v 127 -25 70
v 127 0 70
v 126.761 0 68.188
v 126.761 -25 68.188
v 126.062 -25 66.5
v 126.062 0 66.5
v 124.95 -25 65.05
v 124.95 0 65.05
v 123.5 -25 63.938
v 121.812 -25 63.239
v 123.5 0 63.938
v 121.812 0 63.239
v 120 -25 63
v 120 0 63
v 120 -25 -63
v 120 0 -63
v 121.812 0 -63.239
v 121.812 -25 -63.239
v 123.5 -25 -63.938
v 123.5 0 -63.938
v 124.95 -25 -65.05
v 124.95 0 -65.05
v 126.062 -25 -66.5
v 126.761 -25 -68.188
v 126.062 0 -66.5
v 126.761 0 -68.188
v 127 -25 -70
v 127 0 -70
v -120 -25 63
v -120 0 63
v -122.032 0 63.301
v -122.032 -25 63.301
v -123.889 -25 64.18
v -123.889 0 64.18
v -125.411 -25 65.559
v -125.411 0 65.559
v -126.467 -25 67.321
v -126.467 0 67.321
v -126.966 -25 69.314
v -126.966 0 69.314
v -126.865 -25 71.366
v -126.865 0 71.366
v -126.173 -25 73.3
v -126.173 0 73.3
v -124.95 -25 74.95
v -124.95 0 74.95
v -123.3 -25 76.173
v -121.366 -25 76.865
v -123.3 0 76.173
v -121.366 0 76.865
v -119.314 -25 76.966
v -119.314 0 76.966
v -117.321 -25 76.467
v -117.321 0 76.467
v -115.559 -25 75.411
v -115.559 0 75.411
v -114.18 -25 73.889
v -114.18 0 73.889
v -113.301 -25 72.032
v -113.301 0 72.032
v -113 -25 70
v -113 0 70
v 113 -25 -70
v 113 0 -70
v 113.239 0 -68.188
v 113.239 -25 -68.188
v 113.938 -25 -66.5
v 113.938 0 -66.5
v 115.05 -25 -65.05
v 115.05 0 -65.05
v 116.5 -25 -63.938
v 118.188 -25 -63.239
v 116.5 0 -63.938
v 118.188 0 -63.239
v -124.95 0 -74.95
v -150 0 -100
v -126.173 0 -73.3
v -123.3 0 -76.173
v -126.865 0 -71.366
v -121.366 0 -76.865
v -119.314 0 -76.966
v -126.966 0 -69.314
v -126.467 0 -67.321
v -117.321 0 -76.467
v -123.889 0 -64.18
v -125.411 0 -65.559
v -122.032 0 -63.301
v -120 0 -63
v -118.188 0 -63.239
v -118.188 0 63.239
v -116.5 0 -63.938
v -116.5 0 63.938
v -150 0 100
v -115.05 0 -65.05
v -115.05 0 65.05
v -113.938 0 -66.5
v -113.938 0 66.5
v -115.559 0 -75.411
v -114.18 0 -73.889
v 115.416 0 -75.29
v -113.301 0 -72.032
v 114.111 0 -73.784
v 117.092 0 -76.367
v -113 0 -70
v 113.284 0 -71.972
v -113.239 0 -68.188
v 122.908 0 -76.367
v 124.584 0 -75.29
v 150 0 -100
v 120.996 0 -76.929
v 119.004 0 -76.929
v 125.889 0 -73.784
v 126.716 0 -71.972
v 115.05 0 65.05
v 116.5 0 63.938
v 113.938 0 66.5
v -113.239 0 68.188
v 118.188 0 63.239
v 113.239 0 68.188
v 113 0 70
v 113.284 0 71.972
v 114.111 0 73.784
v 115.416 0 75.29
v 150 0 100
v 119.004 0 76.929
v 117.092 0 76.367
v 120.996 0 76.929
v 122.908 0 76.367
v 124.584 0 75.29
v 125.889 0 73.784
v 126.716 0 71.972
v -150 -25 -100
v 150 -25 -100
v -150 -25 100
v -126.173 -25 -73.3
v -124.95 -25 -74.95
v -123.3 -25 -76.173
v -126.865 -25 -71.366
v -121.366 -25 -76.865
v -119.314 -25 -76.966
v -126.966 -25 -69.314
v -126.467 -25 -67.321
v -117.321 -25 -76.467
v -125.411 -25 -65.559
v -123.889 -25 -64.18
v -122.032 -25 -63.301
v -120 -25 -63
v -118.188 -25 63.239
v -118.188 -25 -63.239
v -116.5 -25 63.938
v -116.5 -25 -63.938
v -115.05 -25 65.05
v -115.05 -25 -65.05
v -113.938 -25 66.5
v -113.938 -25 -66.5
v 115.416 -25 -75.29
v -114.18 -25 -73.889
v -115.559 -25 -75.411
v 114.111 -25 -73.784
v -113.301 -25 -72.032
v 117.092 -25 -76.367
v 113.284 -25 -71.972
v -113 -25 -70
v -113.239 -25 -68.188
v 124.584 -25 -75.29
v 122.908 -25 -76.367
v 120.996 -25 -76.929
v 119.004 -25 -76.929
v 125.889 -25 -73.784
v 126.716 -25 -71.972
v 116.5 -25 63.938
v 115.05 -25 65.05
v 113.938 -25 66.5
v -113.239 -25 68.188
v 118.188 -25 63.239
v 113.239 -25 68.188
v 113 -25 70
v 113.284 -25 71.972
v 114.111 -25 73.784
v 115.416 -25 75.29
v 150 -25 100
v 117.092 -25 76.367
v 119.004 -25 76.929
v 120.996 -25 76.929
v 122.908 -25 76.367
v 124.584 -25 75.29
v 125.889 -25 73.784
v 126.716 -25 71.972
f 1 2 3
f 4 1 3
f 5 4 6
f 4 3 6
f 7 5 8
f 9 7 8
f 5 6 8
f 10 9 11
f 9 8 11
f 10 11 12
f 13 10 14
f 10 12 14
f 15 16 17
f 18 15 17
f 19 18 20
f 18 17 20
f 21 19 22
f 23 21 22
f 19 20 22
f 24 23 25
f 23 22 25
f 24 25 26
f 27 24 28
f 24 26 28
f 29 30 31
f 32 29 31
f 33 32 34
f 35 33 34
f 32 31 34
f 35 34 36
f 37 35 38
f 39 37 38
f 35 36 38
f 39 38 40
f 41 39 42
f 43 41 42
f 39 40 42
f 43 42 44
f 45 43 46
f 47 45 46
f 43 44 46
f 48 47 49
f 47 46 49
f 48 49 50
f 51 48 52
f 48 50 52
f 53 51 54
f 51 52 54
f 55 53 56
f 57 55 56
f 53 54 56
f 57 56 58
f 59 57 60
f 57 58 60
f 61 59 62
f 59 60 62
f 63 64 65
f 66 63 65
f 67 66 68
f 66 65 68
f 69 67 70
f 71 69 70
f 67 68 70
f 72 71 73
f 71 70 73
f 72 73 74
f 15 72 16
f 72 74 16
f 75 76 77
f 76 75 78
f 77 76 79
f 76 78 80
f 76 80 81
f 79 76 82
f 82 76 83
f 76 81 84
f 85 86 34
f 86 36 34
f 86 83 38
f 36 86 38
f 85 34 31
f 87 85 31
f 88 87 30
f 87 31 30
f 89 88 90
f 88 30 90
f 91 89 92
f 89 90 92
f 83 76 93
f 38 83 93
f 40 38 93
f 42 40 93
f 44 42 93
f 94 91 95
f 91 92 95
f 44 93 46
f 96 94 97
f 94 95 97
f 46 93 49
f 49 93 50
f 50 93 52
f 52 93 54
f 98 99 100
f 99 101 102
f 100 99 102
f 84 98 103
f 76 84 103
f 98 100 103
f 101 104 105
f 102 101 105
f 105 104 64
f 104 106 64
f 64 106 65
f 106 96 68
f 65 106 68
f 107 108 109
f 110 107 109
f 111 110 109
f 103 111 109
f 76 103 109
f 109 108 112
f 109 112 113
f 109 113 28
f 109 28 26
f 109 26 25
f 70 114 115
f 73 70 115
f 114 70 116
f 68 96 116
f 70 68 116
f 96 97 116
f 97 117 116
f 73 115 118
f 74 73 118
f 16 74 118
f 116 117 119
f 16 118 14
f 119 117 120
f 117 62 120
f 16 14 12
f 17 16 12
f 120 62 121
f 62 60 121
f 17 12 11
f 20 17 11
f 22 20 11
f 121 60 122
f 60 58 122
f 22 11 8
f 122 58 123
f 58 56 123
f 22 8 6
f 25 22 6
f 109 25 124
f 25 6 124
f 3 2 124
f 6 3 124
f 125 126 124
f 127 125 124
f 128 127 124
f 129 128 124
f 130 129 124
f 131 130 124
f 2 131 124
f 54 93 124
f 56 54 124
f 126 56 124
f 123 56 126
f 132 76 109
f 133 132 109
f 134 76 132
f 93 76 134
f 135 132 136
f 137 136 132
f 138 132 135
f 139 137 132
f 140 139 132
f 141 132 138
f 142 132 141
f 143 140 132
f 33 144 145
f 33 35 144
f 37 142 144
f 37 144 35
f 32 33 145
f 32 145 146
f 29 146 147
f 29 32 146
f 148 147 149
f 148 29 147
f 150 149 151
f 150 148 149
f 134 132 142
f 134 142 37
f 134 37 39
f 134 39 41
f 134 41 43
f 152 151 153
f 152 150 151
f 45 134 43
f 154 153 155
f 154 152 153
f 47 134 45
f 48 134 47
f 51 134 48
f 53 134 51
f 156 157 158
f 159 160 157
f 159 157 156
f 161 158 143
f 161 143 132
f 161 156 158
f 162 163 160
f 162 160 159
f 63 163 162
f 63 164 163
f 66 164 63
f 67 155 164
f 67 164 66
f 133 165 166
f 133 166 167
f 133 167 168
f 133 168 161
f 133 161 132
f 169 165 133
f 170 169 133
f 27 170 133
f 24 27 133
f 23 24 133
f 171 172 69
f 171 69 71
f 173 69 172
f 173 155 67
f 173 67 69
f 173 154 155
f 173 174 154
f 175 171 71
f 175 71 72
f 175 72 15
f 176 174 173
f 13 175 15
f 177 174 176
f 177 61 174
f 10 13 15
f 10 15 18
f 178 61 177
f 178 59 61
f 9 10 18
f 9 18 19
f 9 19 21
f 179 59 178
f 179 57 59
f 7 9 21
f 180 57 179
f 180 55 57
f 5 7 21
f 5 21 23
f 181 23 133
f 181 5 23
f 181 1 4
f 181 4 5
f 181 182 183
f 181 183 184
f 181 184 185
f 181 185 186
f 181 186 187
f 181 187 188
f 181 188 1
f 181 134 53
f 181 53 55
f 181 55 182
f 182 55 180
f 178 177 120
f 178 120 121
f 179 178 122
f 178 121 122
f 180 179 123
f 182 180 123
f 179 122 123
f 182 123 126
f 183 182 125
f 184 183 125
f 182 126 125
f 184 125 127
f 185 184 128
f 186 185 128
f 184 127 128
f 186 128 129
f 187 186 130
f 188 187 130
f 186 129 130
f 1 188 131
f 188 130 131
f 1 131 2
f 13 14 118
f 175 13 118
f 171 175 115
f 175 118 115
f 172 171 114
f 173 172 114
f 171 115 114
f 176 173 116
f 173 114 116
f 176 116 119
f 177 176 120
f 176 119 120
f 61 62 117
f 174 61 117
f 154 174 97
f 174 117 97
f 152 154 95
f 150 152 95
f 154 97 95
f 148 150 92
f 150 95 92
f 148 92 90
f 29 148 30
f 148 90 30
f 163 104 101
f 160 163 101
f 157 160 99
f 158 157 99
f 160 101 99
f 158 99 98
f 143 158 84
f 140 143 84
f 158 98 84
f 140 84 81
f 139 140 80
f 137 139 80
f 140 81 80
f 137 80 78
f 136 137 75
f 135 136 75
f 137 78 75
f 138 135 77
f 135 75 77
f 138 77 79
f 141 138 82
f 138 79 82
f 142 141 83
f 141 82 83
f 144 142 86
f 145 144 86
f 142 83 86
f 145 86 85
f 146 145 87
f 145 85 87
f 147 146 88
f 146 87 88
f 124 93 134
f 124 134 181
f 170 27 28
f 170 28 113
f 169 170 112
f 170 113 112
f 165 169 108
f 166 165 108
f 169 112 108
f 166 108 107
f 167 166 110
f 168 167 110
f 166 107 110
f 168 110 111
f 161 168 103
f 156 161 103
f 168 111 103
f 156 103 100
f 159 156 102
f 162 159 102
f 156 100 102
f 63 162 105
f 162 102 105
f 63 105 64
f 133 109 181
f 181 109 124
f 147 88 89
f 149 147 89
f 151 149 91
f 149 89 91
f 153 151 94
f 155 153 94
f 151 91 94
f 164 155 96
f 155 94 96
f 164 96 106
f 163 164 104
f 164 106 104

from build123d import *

# Parameters (mm, degrees)
F0_W     = 300
F0_H     = 200
F1_DEPTH = 25


with BuildPart() as f1:
    # F0 (on Front) → F1 (new body)
    with BuildSketch(Plane.XZ):
        Rectangle(F0_W, F0_H)
        with BuildLine():
            ThreePointArc((-120, 63), (-124.9497474683, 74.9497474683), (-113, 70))
            Line((-113, 70), (113, 70))
            ThreePointArc((113, 70), (120, 77), (127, 70))
            ThreePointArc((127, 70), (124.9497474683, 65.0502525317), (120, 63))
            Line((120, 63), (120, -63))
            ThreePointArc((120, -63), (124.9497474683, -65.0502525317), (127, -70))
            ThreePointArc((127, -70), (120, -77), (113, -70))
            Line((113, -70), (-113, -70))
            ThreePointArc((-113, -70), (-124.9497474683, -74.9497474683), (-120, -63))
            Line((-120, -63), (-120, 63))
        make_face(mode=Mode.SUBTRACT)
        with BuildLine():
            Line((113, 70), (-113, 70))
            ThreePointArc((-113, 70), (-115.0502525317, 65.0502525317), (-120, 63))
            Line((-120, 63), (-120, -63))
            ThreePointArc((-120, -63), (-115.0502525317, -65.0502525317), (-113, -70))
            Line((-113, -70), (113, -70))
            ThreePointArc((113, -70), (115.0502525317, -65.0502525317), (120, -63))
            Line((120, -63), (120, 63))
            ThreePointArc((120, 63), (115.0502525317, 65.0502525317), (113, 70))
        make_face()
    extrude(amount=F1_DEPTH)


solid = f1.part
